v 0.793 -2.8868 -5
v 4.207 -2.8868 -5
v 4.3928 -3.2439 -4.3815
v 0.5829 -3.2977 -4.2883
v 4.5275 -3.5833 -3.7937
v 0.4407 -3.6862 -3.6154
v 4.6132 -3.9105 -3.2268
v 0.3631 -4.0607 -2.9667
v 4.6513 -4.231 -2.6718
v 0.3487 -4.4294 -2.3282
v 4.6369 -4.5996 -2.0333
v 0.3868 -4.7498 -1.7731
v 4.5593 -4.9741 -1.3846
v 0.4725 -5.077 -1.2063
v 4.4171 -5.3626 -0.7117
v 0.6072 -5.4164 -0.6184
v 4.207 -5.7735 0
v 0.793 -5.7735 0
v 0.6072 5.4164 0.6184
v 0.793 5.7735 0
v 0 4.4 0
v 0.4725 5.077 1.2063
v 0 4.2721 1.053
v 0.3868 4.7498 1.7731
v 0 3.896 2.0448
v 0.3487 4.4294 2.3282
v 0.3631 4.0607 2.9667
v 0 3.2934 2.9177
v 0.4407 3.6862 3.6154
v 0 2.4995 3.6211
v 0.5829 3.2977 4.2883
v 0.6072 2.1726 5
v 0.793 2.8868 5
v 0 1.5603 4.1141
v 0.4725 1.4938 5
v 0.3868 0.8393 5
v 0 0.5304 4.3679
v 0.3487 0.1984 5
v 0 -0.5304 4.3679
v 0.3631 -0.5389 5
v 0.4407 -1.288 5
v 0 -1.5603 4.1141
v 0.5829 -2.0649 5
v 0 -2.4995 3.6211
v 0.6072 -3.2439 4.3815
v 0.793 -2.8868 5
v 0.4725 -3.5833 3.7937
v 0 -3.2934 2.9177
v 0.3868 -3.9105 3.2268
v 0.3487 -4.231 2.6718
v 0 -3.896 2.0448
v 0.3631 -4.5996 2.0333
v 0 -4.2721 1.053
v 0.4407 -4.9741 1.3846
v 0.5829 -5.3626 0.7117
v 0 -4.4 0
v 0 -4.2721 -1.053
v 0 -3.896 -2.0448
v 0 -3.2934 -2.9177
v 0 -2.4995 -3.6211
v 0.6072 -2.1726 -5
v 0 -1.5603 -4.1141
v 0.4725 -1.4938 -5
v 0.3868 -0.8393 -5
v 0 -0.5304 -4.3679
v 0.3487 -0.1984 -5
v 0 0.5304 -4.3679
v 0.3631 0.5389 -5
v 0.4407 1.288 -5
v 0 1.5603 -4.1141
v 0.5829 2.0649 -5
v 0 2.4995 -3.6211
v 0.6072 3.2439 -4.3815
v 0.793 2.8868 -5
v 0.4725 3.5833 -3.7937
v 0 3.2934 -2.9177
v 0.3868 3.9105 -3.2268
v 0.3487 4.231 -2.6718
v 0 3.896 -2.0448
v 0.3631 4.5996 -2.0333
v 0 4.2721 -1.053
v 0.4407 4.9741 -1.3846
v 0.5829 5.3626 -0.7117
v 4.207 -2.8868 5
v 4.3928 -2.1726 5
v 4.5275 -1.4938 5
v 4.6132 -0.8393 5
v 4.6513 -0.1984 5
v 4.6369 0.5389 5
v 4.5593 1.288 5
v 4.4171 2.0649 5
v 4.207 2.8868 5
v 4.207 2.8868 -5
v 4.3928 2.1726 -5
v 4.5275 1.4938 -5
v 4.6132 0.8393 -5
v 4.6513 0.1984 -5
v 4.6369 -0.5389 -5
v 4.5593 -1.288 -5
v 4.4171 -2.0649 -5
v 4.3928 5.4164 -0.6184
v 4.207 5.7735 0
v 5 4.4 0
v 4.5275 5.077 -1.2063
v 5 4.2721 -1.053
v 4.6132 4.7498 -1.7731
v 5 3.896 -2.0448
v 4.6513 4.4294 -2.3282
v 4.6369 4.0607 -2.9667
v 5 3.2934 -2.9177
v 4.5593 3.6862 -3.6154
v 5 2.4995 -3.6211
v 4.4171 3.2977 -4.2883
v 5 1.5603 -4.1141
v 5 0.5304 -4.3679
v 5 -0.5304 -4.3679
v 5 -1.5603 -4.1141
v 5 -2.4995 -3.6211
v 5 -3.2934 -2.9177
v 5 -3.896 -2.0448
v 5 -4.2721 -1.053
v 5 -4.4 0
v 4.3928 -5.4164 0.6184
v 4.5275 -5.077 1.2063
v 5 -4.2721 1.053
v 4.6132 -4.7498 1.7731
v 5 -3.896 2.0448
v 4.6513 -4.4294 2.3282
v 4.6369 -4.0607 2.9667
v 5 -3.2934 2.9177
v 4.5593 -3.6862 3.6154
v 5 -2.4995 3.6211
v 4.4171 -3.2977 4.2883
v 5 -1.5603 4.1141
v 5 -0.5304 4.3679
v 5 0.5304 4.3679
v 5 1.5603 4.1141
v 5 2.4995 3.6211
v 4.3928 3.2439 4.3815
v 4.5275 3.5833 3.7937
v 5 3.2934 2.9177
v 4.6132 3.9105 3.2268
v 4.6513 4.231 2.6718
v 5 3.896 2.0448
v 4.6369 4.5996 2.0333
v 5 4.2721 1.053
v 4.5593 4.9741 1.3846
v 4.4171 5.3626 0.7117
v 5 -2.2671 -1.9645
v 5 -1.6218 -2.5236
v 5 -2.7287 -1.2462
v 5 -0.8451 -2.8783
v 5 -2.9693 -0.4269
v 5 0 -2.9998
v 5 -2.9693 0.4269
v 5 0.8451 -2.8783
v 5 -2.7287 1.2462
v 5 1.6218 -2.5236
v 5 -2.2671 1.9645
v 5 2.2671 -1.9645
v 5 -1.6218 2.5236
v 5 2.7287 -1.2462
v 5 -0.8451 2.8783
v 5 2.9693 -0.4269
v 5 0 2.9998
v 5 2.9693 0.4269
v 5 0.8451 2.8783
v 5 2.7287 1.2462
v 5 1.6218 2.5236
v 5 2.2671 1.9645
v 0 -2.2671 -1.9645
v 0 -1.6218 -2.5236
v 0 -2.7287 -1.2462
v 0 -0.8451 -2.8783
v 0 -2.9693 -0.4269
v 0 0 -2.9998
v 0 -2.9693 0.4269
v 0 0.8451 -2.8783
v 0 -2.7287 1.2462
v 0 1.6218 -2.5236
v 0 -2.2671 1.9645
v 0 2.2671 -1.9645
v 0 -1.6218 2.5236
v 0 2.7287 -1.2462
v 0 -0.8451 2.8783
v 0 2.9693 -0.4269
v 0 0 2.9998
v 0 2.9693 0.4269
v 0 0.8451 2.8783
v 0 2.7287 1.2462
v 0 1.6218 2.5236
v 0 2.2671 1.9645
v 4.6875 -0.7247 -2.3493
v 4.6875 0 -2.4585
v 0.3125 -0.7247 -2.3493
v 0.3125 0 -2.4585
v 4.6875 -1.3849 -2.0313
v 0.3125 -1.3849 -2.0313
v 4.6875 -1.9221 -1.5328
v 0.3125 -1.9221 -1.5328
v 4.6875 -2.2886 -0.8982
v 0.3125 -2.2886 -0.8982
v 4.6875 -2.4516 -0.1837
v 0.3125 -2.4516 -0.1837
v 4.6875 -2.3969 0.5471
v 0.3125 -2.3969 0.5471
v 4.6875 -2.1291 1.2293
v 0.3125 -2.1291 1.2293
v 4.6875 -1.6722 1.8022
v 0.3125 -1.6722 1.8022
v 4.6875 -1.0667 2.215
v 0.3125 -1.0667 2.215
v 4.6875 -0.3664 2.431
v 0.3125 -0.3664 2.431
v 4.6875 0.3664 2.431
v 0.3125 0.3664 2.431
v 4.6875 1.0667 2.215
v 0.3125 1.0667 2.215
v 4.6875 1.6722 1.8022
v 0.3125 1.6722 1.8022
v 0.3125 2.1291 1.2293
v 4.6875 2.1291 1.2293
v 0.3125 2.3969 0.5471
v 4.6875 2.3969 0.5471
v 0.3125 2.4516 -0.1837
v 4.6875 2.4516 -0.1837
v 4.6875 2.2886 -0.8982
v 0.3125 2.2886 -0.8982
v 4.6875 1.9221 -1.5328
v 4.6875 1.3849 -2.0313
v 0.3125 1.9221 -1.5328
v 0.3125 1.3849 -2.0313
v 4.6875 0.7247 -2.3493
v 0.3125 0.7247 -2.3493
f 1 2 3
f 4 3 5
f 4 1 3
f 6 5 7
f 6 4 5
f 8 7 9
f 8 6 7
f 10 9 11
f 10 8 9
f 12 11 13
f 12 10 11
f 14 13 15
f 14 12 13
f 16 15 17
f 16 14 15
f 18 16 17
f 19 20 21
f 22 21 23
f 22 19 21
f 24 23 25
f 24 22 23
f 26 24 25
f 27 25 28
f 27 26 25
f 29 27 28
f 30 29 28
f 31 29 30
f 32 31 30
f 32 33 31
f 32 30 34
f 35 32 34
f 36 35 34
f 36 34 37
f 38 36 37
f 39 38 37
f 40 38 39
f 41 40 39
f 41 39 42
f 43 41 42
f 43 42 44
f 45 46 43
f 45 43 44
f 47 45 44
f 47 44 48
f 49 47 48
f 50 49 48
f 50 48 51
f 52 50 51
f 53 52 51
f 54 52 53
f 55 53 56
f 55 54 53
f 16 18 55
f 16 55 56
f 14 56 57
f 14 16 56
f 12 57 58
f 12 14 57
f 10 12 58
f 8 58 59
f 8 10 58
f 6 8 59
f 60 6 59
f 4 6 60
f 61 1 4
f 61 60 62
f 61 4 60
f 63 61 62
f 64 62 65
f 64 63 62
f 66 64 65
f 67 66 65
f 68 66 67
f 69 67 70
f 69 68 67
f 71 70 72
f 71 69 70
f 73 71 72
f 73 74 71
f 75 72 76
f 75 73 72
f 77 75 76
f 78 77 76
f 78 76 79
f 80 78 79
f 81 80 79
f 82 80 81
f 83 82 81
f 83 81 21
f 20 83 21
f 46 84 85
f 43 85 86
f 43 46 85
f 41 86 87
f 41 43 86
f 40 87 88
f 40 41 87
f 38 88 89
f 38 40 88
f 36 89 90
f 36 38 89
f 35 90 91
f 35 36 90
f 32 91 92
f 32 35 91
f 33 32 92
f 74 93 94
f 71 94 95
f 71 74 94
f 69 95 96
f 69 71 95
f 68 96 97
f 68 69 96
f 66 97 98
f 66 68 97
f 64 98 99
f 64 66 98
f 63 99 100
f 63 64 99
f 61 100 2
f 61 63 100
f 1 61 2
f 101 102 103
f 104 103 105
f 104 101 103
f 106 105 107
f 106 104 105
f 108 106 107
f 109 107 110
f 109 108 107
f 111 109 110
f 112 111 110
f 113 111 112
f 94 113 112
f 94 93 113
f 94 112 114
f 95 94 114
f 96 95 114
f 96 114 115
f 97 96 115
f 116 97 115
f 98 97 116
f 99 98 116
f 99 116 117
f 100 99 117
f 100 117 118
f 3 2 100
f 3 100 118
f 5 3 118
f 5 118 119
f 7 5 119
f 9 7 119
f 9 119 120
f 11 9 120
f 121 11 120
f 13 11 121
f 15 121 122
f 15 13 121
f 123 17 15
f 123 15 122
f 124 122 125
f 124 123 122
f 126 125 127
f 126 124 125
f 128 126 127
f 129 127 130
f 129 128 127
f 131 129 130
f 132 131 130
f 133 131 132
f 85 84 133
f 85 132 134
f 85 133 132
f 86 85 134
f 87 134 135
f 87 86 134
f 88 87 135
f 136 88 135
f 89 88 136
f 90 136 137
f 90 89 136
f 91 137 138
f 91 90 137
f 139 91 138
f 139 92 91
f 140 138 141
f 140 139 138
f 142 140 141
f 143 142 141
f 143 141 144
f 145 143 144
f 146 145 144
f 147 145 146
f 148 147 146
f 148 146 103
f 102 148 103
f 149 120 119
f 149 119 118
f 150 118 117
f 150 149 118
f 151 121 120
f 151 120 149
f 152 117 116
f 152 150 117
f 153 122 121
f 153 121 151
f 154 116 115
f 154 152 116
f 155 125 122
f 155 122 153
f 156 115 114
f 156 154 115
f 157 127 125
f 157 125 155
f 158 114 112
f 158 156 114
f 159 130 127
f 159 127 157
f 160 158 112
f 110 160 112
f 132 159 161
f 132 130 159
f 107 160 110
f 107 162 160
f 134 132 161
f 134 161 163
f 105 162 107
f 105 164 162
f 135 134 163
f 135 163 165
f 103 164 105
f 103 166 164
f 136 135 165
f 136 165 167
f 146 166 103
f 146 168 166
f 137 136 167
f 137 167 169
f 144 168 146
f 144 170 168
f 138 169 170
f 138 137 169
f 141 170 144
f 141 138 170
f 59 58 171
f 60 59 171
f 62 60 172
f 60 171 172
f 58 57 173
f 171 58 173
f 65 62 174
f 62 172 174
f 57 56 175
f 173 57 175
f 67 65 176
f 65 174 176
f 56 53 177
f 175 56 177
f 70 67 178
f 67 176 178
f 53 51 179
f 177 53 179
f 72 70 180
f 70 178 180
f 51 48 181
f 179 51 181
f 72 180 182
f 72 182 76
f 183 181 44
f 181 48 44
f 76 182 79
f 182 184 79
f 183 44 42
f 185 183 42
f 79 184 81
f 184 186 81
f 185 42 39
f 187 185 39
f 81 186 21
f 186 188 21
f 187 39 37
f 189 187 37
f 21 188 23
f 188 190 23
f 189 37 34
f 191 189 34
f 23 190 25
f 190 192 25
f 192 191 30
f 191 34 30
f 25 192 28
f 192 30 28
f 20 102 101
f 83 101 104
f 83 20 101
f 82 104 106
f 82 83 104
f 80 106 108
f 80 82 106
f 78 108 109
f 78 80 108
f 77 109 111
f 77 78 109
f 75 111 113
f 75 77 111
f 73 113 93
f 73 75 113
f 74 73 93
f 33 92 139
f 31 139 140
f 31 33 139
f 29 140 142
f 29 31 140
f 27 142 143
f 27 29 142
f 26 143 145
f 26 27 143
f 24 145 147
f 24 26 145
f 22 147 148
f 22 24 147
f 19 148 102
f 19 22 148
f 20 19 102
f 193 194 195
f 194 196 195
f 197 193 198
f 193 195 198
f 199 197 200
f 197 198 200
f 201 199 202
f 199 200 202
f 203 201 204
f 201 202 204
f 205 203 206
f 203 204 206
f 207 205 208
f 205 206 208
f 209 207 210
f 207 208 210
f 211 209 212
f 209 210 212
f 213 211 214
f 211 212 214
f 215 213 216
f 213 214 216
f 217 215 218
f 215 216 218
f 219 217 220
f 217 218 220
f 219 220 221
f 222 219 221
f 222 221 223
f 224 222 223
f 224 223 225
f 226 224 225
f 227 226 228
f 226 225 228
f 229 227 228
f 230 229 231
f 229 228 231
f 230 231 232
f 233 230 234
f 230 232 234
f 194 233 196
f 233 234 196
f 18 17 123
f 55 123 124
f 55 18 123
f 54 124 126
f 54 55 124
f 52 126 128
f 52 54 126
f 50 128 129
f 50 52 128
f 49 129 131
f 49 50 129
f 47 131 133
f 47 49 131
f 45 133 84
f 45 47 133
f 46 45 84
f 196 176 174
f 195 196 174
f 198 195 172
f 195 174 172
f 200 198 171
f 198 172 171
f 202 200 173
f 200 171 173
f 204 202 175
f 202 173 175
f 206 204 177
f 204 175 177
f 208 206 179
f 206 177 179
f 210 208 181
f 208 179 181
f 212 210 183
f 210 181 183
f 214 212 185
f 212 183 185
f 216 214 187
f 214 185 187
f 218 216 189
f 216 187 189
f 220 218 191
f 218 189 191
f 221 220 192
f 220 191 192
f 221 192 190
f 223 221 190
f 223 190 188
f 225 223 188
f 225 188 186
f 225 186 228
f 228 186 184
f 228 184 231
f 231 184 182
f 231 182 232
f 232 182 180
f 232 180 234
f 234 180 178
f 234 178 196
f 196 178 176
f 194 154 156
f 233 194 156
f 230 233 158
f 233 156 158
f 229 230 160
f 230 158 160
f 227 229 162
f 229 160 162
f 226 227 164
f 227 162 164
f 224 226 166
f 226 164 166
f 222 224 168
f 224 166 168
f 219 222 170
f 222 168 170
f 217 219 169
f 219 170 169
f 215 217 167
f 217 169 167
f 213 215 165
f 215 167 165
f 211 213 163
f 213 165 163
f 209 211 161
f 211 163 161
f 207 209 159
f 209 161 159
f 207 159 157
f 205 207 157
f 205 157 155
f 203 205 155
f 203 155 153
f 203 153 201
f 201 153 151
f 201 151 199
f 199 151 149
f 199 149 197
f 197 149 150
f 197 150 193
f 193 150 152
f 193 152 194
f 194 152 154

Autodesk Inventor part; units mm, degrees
ref_plane "YZ Plane" through (0, 0, 0) normal (1, 0, 0) x (0, 1, 0)
ref_plane "XZ Plane" through (0, 0, 0) normal (0, 1, 0) x (-1, 0, 0)
sketch "Sketch1" plane through (0, 0, 0) normal (1, 0, 0) x (0, 1, 0)
  line L0 (-5.7735, 0) -> (-2.8868, 5)
  line L1 (-2.8868, 5) -> (2.8868, 5)
  line L2 (2.8868, 5) -> (5.7735, 0)
  line L3 (5.7735, 0) -> (2.8868, -5)
  line L4 (2.8868, -5) -> (-2.8868, -5)
  line L5 (-2.8868, -5) -> (-5.7735, 0)
  point P0 (0, 0)
  point P1 (0, 0)
  dimension "d0" = 11.547
extrude "Body" add sketch "Sketch1" along normal blind 5
sketch "Sketch2" plane through (0, 0, 0) normal (0, 0, 1) x (1, 0, 0)
  line L0 (0, 2.8868) -> (0, 5.7735) projected
  line L1 (0, 5.7735) -> (5, 5.7735) projected
  line L2 (5, 2.8868) -> (5, 5.7735) projected
  line L3 (-1, 0) -> (6, 0) projected
  line L4 (0.793, 5.7735) -> (0, 4.4)
  line L5 (4.207, 5.7735) -> (5, 4.4)
  dimension "d3" = 30
  dimension "d4" = 30
  dimension "d5" = 8.8
  dimension "d6" = 8.8
revolve "Chamfer1" cut sketch "Sketch2" angle 360 about axis through (-10, 0, 0) along (1, 0, 0)
sketch "Sketch3" plane through (5, 0, 0) normal (1, 0, 0) x (0, 0, -1)
  arc A0 (-0.625, -1.0825) -> (0.625, -1.0825) centre (0, 0) ccw projected
hole "Thread" at (5, 0, 0) direction (-1, 0, 0) diameter 4.917 end through all thread size "M6x1" class "6H" standard "ISO Metric profile"
chamfer "Chamfer2" distance 0.5413 angle 30 1 edges at (5, 0, 2.4585) measured on face at (5, 3.7042, -0.4498)
chamfer "Chamfer3" distance 0.5413 angle 30 1 edges at (0, 0, 2.4585) measured on face at (0, 3.7042, -0.4498)
ref_plane "Work Plane1" through (-11.098, 0, 0) normal (0, -0.8660254, -0.5) x (1, 0, 0)
equation "\"d0\" = 1.1547 * SW"
equation "\"d1\" = KOH"
equation "\"d8\" = -0.5 * GD1 + 0.5 * NND"
equation "\"d40\" = -0.5 * GD1 + 0.5 * NND"
equation "\"d10\" = -0.5 * GD1 + 0.5 * NND"
equation "\"d41\" = -0.5 * GD1 + 0.5 * NND"
equation "\"d3\" = ANG1"
equation "\"d4\" = ANG2"
equation "\"d5\" = SW0"
equation "\"d6\" = SW01"
equation "\"ANG1\" = 30deg"
equation "\"ANG2\" = 30deg"
equation "\"NND\" = 6"
equation "\"KOH\" = 5"
equation "\"SW0\" = SW01"
equation "\"SW01\" = 8.8"
equation "\"GUL\" = 0.541266 * PTC"
equation "\"THREADDIA\" = 6"
equation "\"TOA\" = 30deg"
equation "\"PTC\" = 1"
equation "\"E0\" = 1.155 * SW"
equation "\"GAL\" = 0.541266 * PTC"
equation "\"SW\" = 10"
equation "\"GD1\" = 4.917468"
properties part number "DIN 934 - M6" material "Steel, Mild"
